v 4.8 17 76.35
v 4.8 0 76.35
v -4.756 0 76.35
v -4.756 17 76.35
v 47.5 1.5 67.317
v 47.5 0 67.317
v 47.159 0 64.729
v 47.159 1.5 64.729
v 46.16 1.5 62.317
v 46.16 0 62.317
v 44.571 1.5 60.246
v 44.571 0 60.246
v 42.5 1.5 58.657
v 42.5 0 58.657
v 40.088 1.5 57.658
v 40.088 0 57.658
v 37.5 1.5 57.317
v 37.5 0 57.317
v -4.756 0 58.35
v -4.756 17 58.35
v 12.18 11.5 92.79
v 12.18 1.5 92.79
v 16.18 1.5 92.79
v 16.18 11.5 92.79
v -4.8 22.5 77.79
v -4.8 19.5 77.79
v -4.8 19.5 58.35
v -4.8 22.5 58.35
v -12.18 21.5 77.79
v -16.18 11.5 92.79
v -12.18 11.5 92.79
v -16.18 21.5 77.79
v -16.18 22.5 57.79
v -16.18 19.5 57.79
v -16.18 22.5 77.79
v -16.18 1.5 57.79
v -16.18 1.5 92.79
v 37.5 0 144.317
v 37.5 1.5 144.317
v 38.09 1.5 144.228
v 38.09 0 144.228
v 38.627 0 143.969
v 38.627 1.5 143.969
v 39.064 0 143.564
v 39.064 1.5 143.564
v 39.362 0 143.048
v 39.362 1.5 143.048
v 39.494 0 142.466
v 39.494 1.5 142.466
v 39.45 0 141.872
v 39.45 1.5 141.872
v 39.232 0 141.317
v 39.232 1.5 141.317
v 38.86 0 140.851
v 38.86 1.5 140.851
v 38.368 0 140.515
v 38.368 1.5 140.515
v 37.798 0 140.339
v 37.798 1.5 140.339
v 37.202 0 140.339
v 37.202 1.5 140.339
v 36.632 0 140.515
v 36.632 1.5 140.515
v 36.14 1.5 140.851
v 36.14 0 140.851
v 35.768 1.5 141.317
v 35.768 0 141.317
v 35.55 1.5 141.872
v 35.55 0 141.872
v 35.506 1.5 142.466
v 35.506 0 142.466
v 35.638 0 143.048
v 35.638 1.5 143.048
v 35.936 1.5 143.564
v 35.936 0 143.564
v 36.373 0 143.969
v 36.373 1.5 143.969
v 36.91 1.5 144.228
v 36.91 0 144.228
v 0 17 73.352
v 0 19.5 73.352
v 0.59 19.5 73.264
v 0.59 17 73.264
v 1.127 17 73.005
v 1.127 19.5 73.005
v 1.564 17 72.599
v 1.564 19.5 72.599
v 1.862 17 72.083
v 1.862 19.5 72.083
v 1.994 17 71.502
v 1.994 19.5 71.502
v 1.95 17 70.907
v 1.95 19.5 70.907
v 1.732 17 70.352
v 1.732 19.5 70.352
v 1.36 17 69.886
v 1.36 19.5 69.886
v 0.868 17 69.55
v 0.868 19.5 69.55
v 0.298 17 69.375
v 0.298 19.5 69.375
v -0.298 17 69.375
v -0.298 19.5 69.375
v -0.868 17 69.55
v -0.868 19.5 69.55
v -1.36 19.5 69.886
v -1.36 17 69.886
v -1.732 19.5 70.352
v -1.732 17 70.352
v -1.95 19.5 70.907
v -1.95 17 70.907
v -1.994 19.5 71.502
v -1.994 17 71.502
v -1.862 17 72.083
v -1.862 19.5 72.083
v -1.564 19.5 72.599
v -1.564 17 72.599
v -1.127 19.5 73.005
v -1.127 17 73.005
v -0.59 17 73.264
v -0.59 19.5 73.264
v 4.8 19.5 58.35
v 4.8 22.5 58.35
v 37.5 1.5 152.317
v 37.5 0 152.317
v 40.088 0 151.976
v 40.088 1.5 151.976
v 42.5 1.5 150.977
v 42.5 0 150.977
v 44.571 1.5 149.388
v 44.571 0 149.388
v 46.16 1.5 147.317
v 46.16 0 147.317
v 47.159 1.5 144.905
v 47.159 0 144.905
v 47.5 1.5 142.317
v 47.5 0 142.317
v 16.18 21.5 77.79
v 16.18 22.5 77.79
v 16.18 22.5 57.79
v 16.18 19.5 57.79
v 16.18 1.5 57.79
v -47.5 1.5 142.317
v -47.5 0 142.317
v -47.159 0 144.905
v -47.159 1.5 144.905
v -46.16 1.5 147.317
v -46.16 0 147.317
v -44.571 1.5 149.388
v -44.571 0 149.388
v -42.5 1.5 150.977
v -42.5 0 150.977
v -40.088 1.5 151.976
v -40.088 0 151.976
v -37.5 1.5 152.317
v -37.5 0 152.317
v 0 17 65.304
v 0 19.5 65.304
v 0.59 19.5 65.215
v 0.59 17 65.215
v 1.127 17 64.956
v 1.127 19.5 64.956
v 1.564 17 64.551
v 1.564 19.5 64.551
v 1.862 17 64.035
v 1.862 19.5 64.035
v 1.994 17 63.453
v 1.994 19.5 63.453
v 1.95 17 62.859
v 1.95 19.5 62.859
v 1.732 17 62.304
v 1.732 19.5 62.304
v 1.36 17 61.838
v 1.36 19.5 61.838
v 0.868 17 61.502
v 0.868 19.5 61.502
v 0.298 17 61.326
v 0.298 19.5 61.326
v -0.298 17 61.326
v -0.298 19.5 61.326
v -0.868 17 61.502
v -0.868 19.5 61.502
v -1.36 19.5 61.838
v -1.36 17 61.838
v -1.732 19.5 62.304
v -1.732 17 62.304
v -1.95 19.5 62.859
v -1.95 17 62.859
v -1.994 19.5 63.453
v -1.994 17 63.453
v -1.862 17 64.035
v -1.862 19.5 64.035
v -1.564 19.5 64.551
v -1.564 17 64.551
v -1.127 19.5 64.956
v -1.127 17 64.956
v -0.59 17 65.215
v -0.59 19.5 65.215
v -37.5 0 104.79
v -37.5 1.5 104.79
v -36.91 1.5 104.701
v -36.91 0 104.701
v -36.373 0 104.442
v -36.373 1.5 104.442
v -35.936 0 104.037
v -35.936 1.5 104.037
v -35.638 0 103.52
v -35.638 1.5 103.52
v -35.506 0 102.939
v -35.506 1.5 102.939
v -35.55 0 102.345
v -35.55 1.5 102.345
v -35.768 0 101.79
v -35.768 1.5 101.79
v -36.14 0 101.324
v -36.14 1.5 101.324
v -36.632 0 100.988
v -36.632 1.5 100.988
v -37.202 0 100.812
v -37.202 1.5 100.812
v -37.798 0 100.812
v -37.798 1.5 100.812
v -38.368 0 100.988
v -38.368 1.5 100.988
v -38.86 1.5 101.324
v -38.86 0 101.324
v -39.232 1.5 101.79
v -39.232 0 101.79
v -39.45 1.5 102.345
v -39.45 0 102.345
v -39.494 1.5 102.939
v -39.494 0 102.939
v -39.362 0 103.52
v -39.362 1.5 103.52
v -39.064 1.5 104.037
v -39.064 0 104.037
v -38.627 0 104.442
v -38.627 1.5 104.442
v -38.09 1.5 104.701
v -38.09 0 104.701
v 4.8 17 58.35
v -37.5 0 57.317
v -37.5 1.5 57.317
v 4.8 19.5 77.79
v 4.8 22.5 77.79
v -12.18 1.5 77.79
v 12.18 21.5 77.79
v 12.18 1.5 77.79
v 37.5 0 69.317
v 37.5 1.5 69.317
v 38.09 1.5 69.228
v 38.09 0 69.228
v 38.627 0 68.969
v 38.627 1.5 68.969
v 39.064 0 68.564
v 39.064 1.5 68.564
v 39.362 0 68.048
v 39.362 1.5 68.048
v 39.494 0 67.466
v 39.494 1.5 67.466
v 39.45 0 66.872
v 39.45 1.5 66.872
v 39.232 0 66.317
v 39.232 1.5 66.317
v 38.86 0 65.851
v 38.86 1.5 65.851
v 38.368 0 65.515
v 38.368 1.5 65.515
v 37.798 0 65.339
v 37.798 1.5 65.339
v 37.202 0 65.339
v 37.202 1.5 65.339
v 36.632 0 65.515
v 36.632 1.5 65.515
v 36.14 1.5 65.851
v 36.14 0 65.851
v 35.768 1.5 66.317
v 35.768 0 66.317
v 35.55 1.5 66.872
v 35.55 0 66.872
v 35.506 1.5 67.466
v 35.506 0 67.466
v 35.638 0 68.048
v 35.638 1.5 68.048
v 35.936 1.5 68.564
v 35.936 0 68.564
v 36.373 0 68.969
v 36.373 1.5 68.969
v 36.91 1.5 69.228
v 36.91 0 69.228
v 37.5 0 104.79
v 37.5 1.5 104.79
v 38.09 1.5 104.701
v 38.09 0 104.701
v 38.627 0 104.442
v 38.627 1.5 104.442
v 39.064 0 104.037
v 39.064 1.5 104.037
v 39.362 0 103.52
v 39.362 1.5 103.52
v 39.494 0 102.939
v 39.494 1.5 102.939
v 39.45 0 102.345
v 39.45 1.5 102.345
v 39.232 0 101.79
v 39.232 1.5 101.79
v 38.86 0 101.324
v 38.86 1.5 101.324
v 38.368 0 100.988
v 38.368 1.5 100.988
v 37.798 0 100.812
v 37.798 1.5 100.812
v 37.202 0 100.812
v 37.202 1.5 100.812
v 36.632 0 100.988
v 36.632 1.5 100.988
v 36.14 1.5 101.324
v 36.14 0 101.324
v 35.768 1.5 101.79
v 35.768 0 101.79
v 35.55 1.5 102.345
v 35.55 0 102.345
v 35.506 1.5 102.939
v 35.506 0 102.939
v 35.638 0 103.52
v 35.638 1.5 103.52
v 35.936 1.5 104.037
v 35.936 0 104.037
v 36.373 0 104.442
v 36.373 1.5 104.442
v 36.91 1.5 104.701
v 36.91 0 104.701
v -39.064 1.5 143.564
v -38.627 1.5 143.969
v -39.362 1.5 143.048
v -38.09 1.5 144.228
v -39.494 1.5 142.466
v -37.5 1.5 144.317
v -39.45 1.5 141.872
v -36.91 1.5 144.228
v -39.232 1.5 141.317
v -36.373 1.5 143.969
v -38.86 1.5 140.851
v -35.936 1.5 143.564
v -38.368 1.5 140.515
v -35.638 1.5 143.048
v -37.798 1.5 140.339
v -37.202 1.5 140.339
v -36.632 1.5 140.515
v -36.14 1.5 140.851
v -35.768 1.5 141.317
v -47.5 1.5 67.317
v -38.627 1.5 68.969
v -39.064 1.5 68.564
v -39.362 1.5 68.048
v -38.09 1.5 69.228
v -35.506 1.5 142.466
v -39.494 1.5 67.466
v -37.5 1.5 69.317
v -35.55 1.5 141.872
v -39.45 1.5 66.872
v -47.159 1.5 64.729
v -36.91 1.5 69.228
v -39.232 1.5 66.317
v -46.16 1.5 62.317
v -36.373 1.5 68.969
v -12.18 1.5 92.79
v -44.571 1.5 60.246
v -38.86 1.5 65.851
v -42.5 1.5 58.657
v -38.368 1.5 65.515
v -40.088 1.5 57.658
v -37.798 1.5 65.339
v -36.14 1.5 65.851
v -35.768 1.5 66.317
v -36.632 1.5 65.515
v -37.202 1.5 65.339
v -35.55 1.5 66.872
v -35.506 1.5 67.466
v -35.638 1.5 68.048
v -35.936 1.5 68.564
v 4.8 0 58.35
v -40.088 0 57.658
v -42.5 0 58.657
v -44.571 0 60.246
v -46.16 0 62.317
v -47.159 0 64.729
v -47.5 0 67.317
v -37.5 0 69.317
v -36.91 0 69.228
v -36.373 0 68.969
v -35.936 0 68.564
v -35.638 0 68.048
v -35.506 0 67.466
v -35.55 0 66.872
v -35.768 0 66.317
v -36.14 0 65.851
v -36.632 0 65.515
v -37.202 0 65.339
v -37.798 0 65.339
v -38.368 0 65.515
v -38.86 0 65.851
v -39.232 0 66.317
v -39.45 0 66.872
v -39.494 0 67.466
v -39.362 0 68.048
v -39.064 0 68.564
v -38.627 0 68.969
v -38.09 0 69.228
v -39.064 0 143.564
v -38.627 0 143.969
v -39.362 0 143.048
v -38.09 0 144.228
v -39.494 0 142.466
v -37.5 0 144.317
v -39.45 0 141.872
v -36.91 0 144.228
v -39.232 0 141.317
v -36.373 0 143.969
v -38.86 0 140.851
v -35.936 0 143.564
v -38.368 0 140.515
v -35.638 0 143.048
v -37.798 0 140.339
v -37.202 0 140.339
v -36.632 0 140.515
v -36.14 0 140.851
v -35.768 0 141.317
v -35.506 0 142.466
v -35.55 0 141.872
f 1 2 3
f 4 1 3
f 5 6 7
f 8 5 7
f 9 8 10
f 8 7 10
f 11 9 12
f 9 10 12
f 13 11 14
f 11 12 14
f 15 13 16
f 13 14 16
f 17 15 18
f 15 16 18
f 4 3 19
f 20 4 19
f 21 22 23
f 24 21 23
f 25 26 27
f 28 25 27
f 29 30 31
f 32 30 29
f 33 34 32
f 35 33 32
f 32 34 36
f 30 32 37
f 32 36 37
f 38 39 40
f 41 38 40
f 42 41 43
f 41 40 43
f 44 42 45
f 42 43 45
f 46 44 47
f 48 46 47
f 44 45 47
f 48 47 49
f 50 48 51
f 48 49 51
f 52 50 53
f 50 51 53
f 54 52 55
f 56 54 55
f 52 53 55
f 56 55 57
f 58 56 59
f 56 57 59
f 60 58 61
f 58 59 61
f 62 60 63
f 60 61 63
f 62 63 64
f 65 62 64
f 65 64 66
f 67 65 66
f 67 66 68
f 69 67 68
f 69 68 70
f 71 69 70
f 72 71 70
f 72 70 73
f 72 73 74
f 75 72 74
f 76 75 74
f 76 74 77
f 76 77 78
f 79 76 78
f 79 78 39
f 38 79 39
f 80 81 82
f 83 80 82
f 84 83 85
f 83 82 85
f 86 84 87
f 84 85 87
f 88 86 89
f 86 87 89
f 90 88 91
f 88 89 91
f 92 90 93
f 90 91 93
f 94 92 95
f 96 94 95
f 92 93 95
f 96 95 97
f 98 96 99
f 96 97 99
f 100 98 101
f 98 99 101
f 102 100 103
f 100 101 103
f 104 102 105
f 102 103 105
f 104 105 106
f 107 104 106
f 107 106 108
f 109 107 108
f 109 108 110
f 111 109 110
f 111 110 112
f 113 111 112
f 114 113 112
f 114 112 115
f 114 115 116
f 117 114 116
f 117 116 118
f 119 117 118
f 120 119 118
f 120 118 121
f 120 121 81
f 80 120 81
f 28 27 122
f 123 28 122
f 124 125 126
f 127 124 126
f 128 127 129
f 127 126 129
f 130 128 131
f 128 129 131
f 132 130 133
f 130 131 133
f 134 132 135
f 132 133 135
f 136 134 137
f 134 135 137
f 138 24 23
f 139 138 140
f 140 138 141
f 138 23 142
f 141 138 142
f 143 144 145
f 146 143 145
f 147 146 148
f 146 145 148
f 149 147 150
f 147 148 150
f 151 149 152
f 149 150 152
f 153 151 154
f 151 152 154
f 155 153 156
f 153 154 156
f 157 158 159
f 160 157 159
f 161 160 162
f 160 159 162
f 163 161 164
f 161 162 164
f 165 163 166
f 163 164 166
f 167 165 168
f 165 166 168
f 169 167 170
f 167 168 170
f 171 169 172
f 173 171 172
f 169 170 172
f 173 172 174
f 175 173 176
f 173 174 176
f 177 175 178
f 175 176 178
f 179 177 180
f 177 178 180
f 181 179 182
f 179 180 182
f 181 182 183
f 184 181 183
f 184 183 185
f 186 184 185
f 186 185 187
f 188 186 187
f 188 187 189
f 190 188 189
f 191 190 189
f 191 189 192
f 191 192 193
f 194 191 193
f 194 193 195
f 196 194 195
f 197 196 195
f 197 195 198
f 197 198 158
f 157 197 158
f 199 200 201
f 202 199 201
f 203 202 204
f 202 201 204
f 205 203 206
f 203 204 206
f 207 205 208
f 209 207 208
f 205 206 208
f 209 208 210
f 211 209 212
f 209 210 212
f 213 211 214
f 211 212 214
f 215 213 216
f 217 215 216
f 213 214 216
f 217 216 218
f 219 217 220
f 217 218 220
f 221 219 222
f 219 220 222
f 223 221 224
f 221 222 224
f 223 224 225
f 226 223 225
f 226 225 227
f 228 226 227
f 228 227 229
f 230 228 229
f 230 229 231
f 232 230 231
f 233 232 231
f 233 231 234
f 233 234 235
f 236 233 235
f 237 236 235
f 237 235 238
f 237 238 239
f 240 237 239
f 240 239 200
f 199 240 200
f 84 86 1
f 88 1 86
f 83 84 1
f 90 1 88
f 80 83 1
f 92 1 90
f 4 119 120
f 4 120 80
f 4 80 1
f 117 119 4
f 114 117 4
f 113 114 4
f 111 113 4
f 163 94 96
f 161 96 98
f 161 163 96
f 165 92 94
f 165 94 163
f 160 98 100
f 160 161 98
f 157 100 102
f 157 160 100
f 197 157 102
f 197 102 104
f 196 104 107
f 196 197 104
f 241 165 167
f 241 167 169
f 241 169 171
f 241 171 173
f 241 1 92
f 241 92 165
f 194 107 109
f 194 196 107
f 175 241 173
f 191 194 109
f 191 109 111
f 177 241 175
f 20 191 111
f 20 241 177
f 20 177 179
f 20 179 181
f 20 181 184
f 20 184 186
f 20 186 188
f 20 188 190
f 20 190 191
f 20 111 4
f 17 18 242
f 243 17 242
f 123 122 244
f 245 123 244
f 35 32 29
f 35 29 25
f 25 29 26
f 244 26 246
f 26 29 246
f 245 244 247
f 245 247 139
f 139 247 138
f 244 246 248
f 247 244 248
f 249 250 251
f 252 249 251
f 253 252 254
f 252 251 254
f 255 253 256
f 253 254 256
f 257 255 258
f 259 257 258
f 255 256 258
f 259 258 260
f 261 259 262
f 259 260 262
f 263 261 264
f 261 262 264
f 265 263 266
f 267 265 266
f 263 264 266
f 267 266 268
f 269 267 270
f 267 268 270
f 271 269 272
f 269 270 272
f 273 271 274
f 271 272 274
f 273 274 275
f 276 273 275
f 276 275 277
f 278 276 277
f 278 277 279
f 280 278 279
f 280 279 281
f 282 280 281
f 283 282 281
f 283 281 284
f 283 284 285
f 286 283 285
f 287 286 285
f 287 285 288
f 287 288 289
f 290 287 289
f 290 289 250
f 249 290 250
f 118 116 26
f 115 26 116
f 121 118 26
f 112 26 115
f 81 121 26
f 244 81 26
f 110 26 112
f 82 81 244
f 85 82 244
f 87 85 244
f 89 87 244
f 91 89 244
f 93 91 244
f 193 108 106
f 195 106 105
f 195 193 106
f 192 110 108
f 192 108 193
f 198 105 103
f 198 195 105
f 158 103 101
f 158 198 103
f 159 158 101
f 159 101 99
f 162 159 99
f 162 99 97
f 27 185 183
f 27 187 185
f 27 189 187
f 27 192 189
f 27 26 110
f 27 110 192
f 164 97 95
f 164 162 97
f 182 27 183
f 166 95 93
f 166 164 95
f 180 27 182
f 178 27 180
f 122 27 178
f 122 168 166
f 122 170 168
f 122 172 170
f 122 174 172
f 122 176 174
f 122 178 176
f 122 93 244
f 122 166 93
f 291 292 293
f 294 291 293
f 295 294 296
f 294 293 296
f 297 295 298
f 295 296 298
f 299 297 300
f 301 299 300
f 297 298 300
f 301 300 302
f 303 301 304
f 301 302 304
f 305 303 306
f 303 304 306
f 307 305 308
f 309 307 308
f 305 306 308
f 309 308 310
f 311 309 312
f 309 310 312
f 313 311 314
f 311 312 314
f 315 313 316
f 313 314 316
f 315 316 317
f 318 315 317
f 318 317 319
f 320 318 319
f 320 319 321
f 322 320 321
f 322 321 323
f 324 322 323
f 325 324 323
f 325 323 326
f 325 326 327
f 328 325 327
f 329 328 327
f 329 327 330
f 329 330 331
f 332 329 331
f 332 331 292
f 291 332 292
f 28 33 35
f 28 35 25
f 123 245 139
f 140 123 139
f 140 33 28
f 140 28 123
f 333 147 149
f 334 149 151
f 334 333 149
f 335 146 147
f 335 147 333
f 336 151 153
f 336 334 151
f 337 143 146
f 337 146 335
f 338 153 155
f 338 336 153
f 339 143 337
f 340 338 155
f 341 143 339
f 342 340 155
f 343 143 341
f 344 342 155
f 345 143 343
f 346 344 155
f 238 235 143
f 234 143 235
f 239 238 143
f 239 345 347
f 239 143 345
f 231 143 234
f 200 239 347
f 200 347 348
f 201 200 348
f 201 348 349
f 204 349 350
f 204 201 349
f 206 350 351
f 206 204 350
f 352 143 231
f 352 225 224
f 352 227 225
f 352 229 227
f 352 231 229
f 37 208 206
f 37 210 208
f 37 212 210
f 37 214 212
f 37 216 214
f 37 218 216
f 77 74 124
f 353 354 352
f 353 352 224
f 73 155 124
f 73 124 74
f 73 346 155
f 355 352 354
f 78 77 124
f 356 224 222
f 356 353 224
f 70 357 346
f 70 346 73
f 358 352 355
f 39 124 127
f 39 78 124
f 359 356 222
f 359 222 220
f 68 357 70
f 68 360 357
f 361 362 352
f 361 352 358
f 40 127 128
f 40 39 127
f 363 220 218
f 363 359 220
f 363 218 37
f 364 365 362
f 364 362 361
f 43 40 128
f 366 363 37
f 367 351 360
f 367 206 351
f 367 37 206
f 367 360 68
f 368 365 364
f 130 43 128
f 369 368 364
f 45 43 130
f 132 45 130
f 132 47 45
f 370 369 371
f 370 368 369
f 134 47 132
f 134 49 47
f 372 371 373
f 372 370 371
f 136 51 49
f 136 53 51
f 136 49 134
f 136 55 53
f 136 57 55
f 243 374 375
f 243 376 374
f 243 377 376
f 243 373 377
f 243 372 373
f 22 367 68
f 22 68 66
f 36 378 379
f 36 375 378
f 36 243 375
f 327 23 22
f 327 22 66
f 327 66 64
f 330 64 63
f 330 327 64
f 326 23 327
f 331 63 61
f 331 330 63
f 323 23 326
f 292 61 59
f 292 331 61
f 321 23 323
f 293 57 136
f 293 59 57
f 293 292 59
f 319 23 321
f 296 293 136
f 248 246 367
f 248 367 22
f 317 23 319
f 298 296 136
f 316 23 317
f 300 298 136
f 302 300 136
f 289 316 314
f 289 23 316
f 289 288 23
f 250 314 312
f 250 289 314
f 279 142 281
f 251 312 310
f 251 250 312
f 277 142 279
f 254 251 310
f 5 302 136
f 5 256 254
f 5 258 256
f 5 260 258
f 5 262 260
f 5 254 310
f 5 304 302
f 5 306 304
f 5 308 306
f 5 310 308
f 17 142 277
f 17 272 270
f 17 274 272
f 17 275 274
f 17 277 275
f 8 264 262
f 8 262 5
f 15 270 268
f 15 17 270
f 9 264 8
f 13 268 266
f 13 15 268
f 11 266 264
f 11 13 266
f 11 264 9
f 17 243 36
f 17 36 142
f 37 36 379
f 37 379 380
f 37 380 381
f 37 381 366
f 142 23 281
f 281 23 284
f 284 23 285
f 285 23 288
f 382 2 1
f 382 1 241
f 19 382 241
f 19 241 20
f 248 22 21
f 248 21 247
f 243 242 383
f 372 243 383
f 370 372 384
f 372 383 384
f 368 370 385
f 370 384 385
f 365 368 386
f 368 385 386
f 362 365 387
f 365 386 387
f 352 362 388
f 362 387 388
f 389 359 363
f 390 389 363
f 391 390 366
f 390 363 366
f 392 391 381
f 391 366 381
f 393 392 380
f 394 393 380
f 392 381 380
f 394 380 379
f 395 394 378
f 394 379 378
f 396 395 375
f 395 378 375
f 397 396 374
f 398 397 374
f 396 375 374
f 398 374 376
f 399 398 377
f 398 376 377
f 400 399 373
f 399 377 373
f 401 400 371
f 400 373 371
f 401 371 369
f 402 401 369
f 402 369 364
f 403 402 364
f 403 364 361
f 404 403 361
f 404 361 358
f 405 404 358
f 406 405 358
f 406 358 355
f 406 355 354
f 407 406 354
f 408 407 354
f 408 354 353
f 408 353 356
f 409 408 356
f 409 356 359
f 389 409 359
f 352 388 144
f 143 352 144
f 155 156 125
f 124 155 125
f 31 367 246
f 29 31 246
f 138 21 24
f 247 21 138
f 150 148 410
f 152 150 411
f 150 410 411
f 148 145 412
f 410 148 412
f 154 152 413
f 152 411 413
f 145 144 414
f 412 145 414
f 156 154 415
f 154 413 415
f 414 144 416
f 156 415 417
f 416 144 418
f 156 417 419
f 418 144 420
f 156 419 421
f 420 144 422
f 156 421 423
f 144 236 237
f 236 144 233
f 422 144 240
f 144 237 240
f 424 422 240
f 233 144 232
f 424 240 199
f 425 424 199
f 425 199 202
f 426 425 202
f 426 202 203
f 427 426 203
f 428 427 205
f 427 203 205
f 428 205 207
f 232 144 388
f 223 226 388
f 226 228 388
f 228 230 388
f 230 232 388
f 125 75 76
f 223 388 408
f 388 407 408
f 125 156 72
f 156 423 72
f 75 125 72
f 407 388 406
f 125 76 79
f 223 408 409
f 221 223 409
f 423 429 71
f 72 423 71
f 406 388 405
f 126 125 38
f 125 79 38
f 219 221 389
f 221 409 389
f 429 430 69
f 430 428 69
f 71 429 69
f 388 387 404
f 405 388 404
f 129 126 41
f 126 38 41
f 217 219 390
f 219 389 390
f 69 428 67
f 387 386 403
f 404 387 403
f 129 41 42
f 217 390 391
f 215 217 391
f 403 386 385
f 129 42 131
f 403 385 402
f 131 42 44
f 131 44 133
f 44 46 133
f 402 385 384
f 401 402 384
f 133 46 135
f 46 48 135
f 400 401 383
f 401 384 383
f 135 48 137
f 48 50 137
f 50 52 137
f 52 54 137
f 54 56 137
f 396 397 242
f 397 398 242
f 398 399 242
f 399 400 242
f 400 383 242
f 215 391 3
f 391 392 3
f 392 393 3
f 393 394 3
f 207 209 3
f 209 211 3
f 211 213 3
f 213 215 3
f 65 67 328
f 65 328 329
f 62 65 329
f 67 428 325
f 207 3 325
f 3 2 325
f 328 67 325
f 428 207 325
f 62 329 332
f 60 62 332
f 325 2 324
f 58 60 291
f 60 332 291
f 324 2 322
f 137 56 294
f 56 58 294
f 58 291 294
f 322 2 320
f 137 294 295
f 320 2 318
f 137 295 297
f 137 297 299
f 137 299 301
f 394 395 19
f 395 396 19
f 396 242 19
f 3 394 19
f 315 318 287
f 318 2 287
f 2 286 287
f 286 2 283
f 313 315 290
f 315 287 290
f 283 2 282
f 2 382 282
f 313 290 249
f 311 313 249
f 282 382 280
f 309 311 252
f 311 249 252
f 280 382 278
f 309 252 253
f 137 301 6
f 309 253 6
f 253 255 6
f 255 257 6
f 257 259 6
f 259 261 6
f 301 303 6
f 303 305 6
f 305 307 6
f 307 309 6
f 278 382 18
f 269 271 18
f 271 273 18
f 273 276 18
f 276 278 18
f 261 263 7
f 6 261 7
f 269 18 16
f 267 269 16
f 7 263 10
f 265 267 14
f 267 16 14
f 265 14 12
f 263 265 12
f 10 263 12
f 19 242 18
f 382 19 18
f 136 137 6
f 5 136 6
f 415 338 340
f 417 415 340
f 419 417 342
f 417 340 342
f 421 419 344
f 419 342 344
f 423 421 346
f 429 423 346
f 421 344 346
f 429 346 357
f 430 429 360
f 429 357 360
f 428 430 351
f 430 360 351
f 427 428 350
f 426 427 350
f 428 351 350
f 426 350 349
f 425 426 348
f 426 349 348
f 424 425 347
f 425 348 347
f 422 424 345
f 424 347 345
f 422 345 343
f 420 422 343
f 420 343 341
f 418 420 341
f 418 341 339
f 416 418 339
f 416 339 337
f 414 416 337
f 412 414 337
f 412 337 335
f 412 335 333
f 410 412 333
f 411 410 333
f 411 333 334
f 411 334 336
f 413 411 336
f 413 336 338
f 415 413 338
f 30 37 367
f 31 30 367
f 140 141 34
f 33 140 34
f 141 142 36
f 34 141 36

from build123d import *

# Parameters (mm, degrees)
EXTRUDE_1_DEPTH      = 1.5
SKETCH_2_W           = 32.36053695
SKETCH_2_H           = 20
EXTRUDE_2_DEPTH      = 18
SKETCH_3_W           = 3.3
SKETCH_3_H           = 0.56
SKETCH_3_W_2         = 0.5
SKETCH_3_W_3         = 1
EXTRUDE_4_DEPTH      = 3
SKETCH_6_W           = 4
SKETCH_6_H           = 15
EXTRUDE_7_DEPTH      = 20
CUT_EXTRUDE_START    = -4
CUT_EXTRUDE_3_DEPTH  = 4
CUT_EXTRUDE_4_DEPTH  = 4
SKETCH_12_R          = 1
CUT_EXTRUDE_9_DEPTH  = 71.381105419
SKETCH_14_R          = 1
CUT_EXTRUDE_10_DEPTH = 71.381105419
SKETCH_15_R          = 1
CUT_EXTRUDE_12_DEPTH = 71.381105419
SKETCH_16_W          = 9.556308291
SKETCH_16_H          = 18
CUT_EXTRUDE_13_DEPTH = 17
CUT_EXTRUDE_14_DEPTH = 161.738742996
SKETCH_18_R          = 2
CUT_EXTRUDE_15_DEPTH = 161.738742996


# Read off the part's stored shape, not the designer's step: 切除-拉伸3, 切除-拉伸4
with BuildPart() as part:
    # 草图1 → 凸台-拉伸1 (new body)
    with BuildSketch(Plane(origin=(0, 0, 104.816917971), x_dir=(1, 0, 0), z_dir=(0, 1, 0))):
        with BuildLine():
            Line((-37.5, -47.5), (37.5, -47.5))
            ThreePointArc((37.5, -47.5), (44.571067812, -44.571067812), (47.5, -37.5))
            Line((47.5, -37.5), (47.5, 37.5))
            ThreePointArc((47.5, 37.5), (44.571067812, 44.571067812), (37.5, 47.5))
            Line((37.5, 47.5), (-37.5, 47.5))
            ThreePointArc((-37.5, 47.5), (-44.571067812, 44.571067812), (-47.5, 37.5))
            Line((-47.5, 37.5), (-47.5, -37.5))
            ThreePointArc((-47.5, -37.5), (-44.571067812, -44.571067812), (-37.5, -47.5))
        make_face()
    extrude(amount=EXTRUDE_1_DEPTH)

    # 草图2 → 凸台-拉伸2 (add)
    with BuildSketch(Plane(origin=(0, 1.5, 104.816917971), x_dir=(1, 0, 0), z_dir=(0, 1, 0))):
        with Locations((0, 37.027280992)):
            Rectangle(SKETCH_2_W, SKETCH_2_H)
    extrude(amount=EXTRUDE_2_DEPTH)

    # 草图3 → 凸台-拉伸4 (add)
    with BuildSketch(Plane(origin=(0, 19.5, 62.644818489), x_dir=(1, 0, 0), z_dir=(0, 1, 0))):
        with Locations((2.15, 4.575181511)):
            Rectangle(SKETCH_3_W, SKETCH_3_H)
        with Locations((-2.15, 4.575181511)):
            Rectangle(SKETCH_3_W, SKETCH_3_H)
        with Locations((-0.25, 4.575181511)):
            Rectangle(SKETCH_3_W_2, SKETCH_3_H)
        with Locations((0.25, 4.575181511)):
            Rectangle(SKETCH_3_W_2, SKETCH_3_H)
        with Locations((4.3, 4.575181511)):
            Rectangle(SKETCH_3_W_3, SKETCH_3_H)
        with Locations((-4.3, 4.575181511)):
            Rectangle(SKETCH_3_W_3, SKETCH_3_H)
        Polygon((4.8, 4.295181511), (4.8, -15.144818489), (16.180268475, -15.144818489), (16.180268475, 4.855181511), (4.8, 4.855181511), align=None)
        Polygon((-4.8, -15.144818489), (-4.8, 4.295181511), (-4.8, 4.855181511), (-16.180268475, 4.855181511), (-16.180268475, -15.144818489), align=None)
    extrude(amount=EXTRUDE_4_DEPTH)

    # 草图6 → 凸台-拉伸7 (add)
    with BuildSketch(Plane(origin=(0, 1.5, 104.816917971), x_dir=(1, 0, 0), z_dir=(0, 1, 0))):
        with Locations((14.180268475, 19.527280992)):
            Rectangle(SKETCH_6_W, SKETCH_6_H)
        with Locations((-14.180268475, 19.527280992)):
            Rectangle(SKETCH_6_W, SKETCH_6_H)
    extrude(amount=EXTRUDE_7_DEPTH)

    # 切除-拉伸3 outline → 切除-拉伸3 (cut)
    with BuildSketch(Plane(origin=(16.180268475, 0, 62.644818489), x_dir=(0, 0, -1), z_dir=(1, 0, 0)).offset(CUT_EXTRUDE_START)):
        Polygon((-30.144818489, 21.5), (-30.144818489, 11.5), (-15.144818489, 21.5), align=None)
    extrude(amount=CUT_EXTRUDE_3_DEPTH, mode=Mode.SUBTRACT)

    # 切除-拉伸4 outline → 切除-拉伸4 (cut)
    with BuildSketch(Plane(origin=(-12.180268475, 0, 70.144818489), x_dir=(0, 0, -1), z_dir=(1, 0, 0)).offset(CUT_EXTRUDE_START)):
        Polygon((-22.644818489, 21.5), (-22.644818489, 11.5), (-7.644818489, 21.5), align=None)
    extrude(amount=CUT_EXTRUDE_4_DEPTH, mode=Mode.SUBTRACT)

    # 草图12 → 切除-拉伸9 (cut, through all)
    with BuildSketch(Plane(origin=(0, 1.5, 104.816917971), x_dir=(1, 0, 0), z_dir=(0, 1, 0))):
        with Locations(Location((-37.5, -37.5, 0), (0, 0, 270))):
            Circle(SKETCH_12_R)
        with Locations(Location((37.5, -37.5, 0), (0, 0, 270))):
            Circle(SKETCH_12_R)
        with Locations(Location((37.5, 37.5, 0), (0, 0, 270))):
            Circle(SKETCH_12_R)
    extrude(amount=-CUT_EXTRUDE_9_DEPTH, mode=Mode.SUBTRACT)

    # 草图14 → 切除-拉伸10 (cut, through all)
    with BuildSketch(Plane(origin=(0, 1.5, 104.816917971), x_dir=(1, 0, 0), z_dir=(0, 1, 0))):
        with Locations(Location((-37.5, 37.5, 0), (0, 0, 270))):
            Circle(SKETCH_14_R)
    extrude(amount=-CUT_EXTRUDE_10_DEPTH, mode=Mode.SUBTRACT)

    # 草图15 → 切除-拉伸12 (cut, through all)
    with BuildSketch(Plane(origin=(0, 1.5, 104.816917971), x_dir=(1, 0, 0), z_dir=(0, 1, 0))):
        with Locations(Location((-37.5, 2.027280992, 0), (0, 0, 270))):
            Circle(SKETCH_15_R)
        with Locations(Location((37.5, 2.027280992, 0), (0, 0, 270))):
            Circle(SKETCH_15_R)
    extrude(amount=-CUT_EXTRUDE_12_DEPTH, mode=Mode.SUBTRACT)

    # 草图16 → 切除-拉伸13 (cut)
    with BuildSketch(Plane(origin=(0, 0, 0), x_dir=(-1, 0, 0), z_dir=(0, -1, 0))):
        with Locations((-0.021845855, -67.349636979)):
            Rectangle(SKETCH_16_W, SKETCH_16_H)
    extrude(amount=-CUT_EXTRUDE_13_DEPTH, mode=Mode.SUBTRACT)

    # 草图17 → 切除-拉伸14 (cut, through all)
    with BuildSketch(Plane(origin=(0, 19.5, 0), x_dir=(1, 0, 0), z_dir=(0, 1, 0))):
        with BuildLine():
            ThreePointArc((0, -70.3523833), (-1, -71.3523833), (0, -72.3523833))
            Line((0, -72.3523833), (0, -71.3523833))
            Line((0, -71.3523833), (0, -70.3523833))
        make_face()
        with BuildLine():
            Line((0, -71.3523833), (0, -72.3523833))
            ThreePointArc((0, -72.3523833), (0.707106781, -72.059490081), (1, -71.3523833))
            ThreePointArc((1, -71.3523833), (0.707106781, -70.645276519), (0, -70.3523833))
            Line((0, -70.3523833), (0, -71.3523833))
        make_face()
        with BuildLine():
            ThreePointArc((0, -62.303923017), (-1, -63.303923017), (0, -64.303923017))
            Line((0, -64.303923017), (0, -63.303923017))
            Line((0, -63.303923017), (0, -62.303923017))
        make_face()
        with BuildLine():
            Line((0, -63.303923017), (0, -64.303923017))
            ThreePointArc((0, -64.303923017), (0.707106781, -64.011029798), (1, -63.303923017))
            ThreePointArc((1, -63.303923017), (0.707106781, -62.596816236), (0, -62.303923017))
            Line((0, -62.303923017), (0, -63.303923017))
        make_face()
    extrude(amount=-CUT_EXTRUDE_14_DEPTH, mode=Mode.SUBTRACT)

    # 草图18 → 切除-拉伸15 (cut, through all)
    with BuildSketch(Plane(origin=(0, 19.5, 0), x_dir=(1, 0, 0), z_dir=(0, 1, 0))):
        with Locations(Location((0, -63.303923017, 0), (0, 0, 270))):
            Circle(SKETCH_18_R)
        with Locations(Location((0, -71.3523833, 0), (0, 0, 270))):
            Circle(SKETCH_18_R)
        with Locations(Location((-37.5, -67.316917971, 0), (0, 0, 270))):
            Circle(SKETCH_18_R)
        with Locations(Location((37.5, -67.316917971, 0), (0, 0, 270))):
            Circle(SKETCH_18_R)
        with Locations(Location((37.5, -102.789636979, 0), (0, 0, 270))):
            Circle(SKETCH_18_R)
        with Locations(Location((-37.5, -102.789636979, 0), (0, 0, 270))):
            Circle(SKETCH_18_R)
        with Locations(Location((-37.5, -142.316917971, 0), (0, 0, 270))):
            Circle(SKETCH_18_R)
        with Locations(Location((37.5, -142.316917971, 0), (0, 0, 270))):
            Circle(SKETCH_18_R)
    extrude(amount=-CUT_EXTRUDE_15_DEPTH, mode=Mode.SUBTRACT)


solid = part.part
